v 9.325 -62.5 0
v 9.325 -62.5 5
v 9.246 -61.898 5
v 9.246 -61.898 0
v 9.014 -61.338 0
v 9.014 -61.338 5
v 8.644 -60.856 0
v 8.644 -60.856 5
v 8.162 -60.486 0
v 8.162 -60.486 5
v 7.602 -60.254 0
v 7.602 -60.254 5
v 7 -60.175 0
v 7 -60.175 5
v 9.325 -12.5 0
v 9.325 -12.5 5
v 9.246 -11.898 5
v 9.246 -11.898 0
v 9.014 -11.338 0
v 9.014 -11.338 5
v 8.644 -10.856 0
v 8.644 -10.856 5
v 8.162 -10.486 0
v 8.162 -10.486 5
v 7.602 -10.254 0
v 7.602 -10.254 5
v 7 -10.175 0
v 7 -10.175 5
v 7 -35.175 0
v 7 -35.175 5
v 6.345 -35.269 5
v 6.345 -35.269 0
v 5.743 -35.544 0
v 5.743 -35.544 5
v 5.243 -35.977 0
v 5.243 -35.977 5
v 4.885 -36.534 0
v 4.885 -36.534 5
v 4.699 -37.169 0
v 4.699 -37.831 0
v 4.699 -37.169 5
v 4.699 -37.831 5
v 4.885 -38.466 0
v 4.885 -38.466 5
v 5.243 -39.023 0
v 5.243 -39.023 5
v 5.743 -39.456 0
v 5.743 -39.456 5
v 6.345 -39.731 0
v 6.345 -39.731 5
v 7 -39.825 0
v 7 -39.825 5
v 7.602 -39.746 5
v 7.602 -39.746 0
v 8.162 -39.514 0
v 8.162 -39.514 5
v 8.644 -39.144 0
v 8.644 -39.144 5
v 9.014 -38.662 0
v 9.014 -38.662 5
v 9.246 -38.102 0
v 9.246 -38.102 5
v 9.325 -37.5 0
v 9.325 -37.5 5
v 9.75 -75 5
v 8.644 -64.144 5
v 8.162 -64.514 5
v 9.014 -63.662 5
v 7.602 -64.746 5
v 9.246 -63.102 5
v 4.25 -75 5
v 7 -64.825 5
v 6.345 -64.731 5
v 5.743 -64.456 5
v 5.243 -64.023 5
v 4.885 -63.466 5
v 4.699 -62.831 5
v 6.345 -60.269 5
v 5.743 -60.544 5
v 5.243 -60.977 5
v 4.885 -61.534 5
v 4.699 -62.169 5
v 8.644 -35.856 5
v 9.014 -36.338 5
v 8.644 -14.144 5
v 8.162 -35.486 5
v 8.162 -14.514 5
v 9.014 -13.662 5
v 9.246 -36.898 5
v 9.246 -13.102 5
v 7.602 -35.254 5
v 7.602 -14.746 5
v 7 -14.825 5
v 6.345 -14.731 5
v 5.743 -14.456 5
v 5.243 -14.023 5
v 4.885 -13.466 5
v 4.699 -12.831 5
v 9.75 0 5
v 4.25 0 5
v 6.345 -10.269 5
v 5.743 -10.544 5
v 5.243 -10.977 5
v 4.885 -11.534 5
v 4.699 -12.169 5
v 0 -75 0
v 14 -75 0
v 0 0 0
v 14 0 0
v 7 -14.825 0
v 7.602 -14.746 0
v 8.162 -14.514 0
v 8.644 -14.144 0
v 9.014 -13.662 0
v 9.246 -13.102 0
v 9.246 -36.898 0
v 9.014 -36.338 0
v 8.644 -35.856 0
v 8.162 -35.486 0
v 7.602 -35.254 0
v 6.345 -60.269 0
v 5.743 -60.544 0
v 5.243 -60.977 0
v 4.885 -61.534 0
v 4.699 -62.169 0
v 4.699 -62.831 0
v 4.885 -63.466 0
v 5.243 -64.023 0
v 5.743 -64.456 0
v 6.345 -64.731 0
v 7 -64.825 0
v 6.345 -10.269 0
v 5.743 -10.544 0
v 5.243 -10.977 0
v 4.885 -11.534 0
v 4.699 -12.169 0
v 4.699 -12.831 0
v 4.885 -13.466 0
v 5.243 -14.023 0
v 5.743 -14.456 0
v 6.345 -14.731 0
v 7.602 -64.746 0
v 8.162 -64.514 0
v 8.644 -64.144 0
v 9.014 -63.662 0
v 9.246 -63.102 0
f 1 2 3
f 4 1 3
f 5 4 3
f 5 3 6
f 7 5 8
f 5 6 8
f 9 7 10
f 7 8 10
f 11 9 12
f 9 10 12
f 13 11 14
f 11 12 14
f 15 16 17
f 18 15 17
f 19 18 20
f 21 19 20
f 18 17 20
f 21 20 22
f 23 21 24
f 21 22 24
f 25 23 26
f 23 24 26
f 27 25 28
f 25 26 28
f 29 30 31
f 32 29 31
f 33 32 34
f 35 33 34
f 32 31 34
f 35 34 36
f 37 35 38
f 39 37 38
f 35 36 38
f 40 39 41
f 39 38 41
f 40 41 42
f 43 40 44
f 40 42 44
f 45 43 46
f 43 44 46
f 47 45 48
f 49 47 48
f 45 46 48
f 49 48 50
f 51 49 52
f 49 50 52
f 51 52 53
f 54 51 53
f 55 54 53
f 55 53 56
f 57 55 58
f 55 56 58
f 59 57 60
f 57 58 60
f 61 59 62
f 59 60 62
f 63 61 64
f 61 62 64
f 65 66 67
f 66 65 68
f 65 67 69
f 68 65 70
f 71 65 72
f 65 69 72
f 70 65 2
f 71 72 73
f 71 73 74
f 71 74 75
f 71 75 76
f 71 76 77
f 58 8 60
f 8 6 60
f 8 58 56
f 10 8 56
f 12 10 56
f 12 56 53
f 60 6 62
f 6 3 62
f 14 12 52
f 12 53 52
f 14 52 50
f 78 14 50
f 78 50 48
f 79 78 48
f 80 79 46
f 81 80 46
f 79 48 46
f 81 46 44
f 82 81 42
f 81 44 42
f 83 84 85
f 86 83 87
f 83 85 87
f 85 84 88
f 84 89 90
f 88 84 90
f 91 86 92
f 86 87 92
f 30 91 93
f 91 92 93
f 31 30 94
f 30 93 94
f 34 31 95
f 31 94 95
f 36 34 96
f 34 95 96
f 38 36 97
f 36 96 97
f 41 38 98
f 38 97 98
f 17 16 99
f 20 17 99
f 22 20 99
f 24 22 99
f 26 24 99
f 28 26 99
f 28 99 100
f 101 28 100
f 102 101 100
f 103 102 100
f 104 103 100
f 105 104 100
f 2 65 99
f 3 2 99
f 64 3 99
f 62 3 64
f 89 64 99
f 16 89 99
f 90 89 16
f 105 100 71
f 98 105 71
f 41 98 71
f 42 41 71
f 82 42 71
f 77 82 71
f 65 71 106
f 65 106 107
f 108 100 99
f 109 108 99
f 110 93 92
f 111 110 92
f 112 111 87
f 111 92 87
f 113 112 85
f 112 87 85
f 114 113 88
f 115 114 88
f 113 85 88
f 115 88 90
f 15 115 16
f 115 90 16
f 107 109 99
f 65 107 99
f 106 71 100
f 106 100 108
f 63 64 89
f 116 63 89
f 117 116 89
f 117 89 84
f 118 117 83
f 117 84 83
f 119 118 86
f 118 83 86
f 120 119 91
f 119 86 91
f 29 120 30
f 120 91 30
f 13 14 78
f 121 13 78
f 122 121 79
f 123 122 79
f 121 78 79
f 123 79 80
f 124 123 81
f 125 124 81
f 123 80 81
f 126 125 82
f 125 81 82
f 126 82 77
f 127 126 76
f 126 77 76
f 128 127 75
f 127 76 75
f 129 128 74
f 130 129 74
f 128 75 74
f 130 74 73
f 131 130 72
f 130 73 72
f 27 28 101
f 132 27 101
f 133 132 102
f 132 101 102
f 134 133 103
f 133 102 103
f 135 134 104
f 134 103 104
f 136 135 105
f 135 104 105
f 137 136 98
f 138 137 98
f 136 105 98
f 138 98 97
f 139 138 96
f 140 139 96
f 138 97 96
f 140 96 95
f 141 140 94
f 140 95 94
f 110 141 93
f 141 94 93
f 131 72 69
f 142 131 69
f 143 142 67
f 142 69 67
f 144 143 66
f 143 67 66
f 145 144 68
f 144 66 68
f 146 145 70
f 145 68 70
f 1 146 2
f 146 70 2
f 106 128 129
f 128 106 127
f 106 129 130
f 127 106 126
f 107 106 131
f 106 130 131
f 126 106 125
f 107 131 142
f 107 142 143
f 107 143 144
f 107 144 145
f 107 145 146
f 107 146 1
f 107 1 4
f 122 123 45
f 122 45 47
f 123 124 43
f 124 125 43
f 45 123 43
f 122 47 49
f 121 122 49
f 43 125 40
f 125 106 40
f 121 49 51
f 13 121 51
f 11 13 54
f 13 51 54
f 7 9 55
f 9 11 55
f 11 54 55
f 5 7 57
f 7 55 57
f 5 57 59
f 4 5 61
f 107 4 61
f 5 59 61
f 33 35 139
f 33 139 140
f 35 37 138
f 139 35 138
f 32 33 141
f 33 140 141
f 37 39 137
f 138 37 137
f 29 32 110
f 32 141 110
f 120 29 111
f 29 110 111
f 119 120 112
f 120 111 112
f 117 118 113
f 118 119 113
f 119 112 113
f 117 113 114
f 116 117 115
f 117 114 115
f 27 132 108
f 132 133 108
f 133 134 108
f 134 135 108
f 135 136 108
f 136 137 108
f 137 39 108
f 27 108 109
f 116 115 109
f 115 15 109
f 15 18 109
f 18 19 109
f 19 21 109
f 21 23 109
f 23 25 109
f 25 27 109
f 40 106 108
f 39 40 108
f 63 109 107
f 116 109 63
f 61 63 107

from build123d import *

# Parameters (mm, degrees)
F1_DEPTH = 75
F3_DEPTH = 5


with BuildPart() as f1:
    # F0 (on Front) → F1 (new body)
    with BuildSketch(Plane.XZ):
        Polygon((4.25, 5), (0, 0), (7, 0), (7, 5), align=None)
        Polygon((7, 5), (7, 0), (14, 0), (9.75, 5), align=None)
    extrude(amount=F1_DEPTH)

    # F2 (on face) → F3 (cut, through all)
    with BuildSketch(Plane.XY.offset(5)):
        with BuildLine():
            ThreePointArc((7, -14.825), (8.644023, -14.144023), (9.325, -12.5))
            ThreePointArc((9.325, -12.5), (8.644023, -10.855977), (7, -10.175))
            Line((7, -10.175), (7, -14.825))
        make_face()
        with BuildLine():
            ThreePointArc((9.325, -62.5), (8.644023, -60.855977), (7, -60.175))
            Line((7, -60.175), (7, -64.825))
            ThreePointArc((7, -64.825), (8.644023, -64.144023), (9.325, -62.5))
        make_face()
        with BuildLine():
            Line((7, -64.825), (7, -60.175))
            ThreePointArc((7, -60.175), (4.675, -62.5), (7, -64.825))
        make_face()
        with BuildLine():
            ThreePointArc((9.325, -37.5), (8.644023, -35.855977), (7, -35.175))
            Line((7, -35.175), (7, -39.825))
            ThreePointArc((7, -39.825), (8.644023, -39.144023), (9.325, -37.5))
        make_face()
        with BuildLine():
            Line((7, -39.825), (7, -35.175))
            ThreePointArc((7, -35.175), (4.675, -37.5), (7, -39.825))
        make_face()
        with BuildLine():
            Line((7, -14.825), (7, -10.175))
            ThreePointArc((7, -10.175), (4.675, -12.5), (7, -14.825))
        make_face()
    extrude(amount=-F3_DEPTH, mode=Mode.SUBTRACT)


solid = f1.part
